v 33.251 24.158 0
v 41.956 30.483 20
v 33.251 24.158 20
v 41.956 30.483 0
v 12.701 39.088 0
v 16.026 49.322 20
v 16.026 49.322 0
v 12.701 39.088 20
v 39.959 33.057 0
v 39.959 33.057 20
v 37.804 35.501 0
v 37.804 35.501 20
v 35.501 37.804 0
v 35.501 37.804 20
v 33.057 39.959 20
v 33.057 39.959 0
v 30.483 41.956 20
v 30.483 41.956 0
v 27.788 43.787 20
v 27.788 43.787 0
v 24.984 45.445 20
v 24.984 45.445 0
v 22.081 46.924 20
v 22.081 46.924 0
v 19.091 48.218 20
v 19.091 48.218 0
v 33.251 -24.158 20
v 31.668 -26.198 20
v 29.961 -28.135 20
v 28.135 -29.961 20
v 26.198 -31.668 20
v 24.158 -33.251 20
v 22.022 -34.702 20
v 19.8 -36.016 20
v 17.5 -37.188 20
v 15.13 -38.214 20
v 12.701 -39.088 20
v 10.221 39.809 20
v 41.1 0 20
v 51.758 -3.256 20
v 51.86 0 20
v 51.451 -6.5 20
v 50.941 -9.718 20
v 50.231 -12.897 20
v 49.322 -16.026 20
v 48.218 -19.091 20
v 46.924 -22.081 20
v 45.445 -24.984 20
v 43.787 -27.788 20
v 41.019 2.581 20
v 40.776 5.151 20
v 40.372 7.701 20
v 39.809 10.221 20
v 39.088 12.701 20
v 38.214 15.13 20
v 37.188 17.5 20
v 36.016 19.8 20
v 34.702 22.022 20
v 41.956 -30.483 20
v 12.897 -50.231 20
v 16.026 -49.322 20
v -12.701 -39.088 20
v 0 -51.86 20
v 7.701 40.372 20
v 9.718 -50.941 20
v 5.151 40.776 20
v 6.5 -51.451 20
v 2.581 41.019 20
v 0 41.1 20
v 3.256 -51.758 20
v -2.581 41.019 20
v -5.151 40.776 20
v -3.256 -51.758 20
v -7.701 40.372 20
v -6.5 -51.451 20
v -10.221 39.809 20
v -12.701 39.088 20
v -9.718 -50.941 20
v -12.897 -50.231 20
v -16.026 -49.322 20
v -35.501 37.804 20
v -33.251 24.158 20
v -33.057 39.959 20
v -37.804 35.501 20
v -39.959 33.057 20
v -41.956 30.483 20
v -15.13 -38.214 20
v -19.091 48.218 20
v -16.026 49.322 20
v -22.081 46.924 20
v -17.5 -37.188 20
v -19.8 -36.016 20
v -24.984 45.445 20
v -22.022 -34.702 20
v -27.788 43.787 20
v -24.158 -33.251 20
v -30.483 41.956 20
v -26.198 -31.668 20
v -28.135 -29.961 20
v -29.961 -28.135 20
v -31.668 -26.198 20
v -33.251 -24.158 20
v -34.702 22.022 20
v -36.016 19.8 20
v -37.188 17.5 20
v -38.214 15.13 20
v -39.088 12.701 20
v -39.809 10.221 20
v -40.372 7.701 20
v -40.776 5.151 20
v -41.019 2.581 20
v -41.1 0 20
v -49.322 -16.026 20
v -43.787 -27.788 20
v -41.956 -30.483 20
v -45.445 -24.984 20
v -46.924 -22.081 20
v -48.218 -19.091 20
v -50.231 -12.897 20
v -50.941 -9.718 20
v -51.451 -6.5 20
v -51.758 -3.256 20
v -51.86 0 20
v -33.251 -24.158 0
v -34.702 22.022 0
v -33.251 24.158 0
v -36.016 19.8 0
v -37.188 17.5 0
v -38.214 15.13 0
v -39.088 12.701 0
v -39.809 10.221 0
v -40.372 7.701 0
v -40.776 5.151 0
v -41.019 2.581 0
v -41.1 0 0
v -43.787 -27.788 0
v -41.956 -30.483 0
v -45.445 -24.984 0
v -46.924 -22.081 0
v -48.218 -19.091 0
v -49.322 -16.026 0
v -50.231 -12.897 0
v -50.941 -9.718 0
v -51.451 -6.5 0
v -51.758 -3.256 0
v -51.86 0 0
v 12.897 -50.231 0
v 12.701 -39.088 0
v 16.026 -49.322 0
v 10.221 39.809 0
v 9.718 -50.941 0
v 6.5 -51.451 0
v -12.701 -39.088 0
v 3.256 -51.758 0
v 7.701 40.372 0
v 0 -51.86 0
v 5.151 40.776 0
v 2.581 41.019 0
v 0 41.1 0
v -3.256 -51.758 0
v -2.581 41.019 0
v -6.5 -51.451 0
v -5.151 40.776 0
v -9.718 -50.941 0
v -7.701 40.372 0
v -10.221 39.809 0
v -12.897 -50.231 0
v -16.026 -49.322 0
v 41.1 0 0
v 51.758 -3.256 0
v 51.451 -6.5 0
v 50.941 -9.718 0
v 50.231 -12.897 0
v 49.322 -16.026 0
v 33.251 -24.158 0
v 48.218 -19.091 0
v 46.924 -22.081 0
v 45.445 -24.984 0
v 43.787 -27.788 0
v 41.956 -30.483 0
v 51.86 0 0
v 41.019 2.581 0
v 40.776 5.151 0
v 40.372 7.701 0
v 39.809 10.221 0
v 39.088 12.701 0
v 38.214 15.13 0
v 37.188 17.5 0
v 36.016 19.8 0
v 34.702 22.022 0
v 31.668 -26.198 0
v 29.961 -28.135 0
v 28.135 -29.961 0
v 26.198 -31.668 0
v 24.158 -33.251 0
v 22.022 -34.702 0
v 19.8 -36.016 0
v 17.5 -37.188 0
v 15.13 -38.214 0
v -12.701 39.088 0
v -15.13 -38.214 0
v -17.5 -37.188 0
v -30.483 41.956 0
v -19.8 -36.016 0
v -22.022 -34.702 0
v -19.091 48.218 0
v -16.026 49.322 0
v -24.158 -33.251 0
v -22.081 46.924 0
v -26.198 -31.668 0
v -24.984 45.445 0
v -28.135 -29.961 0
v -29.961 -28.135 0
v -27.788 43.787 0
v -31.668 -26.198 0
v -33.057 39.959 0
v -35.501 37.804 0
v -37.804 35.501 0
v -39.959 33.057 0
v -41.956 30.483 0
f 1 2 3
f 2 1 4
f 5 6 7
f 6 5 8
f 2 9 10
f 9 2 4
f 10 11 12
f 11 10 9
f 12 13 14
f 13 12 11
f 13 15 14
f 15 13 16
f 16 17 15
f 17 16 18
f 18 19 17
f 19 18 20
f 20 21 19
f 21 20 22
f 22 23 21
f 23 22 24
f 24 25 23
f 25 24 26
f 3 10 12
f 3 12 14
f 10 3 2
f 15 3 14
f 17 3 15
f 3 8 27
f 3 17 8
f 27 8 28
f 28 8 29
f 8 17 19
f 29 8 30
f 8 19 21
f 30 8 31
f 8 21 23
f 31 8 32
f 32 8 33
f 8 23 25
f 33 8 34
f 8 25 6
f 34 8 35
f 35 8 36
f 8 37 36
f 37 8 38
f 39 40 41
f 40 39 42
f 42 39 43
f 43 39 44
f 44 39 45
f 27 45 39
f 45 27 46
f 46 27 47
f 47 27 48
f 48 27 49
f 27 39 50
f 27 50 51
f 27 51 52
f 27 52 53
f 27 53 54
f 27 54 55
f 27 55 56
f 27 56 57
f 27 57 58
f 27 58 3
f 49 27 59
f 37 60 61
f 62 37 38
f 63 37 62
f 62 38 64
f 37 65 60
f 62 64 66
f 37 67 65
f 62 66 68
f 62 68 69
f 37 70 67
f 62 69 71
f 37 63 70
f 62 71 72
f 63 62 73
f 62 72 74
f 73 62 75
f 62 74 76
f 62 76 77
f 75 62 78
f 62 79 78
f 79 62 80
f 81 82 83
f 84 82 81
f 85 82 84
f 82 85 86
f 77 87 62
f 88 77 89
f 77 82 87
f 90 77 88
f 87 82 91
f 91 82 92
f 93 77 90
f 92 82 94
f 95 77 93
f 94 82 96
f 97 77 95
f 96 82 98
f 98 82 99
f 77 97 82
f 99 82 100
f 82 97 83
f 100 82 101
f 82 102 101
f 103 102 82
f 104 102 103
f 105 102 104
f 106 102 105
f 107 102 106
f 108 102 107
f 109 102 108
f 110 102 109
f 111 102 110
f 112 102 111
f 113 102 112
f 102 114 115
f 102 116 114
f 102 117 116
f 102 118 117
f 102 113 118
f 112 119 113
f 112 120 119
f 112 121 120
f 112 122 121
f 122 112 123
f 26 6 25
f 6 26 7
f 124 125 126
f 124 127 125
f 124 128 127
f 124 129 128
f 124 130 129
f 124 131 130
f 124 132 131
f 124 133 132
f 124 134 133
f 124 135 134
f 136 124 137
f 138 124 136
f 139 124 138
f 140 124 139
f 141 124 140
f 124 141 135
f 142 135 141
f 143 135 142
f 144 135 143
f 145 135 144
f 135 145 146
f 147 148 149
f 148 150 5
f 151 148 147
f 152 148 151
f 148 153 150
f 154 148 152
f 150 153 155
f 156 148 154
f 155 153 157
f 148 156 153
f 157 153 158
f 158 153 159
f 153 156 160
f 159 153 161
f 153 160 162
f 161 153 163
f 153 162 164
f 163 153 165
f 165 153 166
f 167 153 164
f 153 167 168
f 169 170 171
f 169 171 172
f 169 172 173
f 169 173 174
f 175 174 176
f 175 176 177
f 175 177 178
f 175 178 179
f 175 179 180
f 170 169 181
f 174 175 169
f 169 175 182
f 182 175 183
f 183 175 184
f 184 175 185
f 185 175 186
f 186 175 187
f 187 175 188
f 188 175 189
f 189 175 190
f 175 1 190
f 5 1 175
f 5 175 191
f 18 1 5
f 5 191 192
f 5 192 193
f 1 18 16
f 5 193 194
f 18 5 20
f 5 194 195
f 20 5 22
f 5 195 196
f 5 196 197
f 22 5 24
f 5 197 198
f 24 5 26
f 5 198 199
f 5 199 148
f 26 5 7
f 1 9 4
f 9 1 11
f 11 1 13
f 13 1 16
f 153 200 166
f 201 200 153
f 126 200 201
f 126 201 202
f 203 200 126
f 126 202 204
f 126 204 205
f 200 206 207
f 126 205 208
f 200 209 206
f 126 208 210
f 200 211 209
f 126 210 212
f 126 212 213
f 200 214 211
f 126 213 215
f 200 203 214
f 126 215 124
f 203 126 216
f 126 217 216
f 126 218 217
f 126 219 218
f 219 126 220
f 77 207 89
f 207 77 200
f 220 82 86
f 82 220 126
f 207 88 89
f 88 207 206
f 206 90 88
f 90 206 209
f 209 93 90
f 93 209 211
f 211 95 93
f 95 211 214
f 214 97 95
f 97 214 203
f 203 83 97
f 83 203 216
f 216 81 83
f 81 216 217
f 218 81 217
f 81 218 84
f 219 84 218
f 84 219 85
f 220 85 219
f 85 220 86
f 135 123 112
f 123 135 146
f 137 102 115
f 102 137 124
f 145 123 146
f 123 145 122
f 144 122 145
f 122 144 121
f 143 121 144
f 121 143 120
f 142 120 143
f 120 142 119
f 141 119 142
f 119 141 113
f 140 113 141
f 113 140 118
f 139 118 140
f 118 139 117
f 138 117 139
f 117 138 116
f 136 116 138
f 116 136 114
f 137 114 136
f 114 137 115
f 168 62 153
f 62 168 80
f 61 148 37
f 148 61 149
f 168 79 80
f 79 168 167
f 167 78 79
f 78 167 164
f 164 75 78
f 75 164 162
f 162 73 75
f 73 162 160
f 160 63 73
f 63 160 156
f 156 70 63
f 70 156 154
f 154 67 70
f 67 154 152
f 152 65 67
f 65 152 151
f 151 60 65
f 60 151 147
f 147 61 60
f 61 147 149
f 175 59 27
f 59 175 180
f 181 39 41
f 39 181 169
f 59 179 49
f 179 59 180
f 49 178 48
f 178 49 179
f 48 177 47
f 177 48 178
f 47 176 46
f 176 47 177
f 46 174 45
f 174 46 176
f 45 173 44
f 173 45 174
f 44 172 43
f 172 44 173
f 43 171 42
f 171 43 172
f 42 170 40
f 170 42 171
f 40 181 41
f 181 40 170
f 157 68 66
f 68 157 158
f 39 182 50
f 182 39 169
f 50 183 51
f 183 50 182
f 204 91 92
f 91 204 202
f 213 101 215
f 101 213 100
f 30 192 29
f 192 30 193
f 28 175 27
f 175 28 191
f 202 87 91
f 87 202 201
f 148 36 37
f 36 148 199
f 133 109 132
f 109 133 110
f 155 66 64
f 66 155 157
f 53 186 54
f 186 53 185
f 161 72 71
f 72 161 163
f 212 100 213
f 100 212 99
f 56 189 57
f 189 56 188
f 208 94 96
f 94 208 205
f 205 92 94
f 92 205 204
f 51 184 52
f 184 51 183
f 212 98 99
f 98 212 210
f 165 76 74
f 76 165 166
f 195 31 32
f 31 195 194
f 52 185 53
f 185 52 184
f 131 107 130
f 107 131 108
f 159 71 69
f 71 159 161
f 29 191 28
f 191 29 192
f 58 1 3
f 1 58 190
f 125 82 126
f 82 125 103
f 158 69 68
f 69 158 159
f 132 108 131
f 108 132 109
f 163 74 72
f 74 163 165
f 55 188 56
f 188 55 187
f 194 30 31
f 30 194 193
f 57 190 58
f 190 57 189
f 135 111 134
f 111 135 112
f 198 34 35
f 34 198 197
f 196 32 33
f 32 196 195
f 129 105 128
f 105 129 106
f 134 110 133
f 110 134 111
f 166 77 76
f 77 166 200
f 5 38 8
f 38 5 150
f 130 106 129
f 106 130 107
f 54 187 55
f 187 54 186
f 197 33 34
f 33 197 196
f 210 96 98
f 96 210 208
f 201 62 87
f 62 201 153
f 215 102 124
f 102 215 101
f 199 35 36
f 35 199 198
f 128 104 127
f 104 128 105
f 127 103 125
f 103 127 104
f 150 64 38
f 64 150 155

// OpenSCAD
//cowling brace piece for outdoor impelementations of the dummbell antenna
//by Abraxas3d 6 August 2023 for Open Research Institute
//CC by 4.0 
//https://creativecommons.org/licenses/by/4.0/

// A cynlinder, with rectangular gear teeth added at intervals appropriate 
// for winding the wires in the dumbbell-type shortened HF antenna.
// In that type of antenna, there is an inductive load section of the 
// half-wave dipole. Two of these disks will allow the inductive load to be
// formed around a cylindrical shape to make it easier to deploy outdoors. 

$fn = 100;
optimized_diameter = 82.2; //mm
outside_diameter = 107.6; //mm
disk_thickness = 20; //mm
integerNumHumps = 5;
subtended = 360/(2*integerNumHumps); //in degrees


union()
{
cylinder(h = disk_thickness, r1 = optimized_diameter/2, r2 = optimized_diameter/2);

for (i =[1:integerNumHumps])
{
rotate([0,0,(2*i-1)*subtended])
rotate_extrude(angle=subtended)
translate([optimized_diameter/2,0,0])
square([outside_diameter/10,disk_thickness]);
}

}
